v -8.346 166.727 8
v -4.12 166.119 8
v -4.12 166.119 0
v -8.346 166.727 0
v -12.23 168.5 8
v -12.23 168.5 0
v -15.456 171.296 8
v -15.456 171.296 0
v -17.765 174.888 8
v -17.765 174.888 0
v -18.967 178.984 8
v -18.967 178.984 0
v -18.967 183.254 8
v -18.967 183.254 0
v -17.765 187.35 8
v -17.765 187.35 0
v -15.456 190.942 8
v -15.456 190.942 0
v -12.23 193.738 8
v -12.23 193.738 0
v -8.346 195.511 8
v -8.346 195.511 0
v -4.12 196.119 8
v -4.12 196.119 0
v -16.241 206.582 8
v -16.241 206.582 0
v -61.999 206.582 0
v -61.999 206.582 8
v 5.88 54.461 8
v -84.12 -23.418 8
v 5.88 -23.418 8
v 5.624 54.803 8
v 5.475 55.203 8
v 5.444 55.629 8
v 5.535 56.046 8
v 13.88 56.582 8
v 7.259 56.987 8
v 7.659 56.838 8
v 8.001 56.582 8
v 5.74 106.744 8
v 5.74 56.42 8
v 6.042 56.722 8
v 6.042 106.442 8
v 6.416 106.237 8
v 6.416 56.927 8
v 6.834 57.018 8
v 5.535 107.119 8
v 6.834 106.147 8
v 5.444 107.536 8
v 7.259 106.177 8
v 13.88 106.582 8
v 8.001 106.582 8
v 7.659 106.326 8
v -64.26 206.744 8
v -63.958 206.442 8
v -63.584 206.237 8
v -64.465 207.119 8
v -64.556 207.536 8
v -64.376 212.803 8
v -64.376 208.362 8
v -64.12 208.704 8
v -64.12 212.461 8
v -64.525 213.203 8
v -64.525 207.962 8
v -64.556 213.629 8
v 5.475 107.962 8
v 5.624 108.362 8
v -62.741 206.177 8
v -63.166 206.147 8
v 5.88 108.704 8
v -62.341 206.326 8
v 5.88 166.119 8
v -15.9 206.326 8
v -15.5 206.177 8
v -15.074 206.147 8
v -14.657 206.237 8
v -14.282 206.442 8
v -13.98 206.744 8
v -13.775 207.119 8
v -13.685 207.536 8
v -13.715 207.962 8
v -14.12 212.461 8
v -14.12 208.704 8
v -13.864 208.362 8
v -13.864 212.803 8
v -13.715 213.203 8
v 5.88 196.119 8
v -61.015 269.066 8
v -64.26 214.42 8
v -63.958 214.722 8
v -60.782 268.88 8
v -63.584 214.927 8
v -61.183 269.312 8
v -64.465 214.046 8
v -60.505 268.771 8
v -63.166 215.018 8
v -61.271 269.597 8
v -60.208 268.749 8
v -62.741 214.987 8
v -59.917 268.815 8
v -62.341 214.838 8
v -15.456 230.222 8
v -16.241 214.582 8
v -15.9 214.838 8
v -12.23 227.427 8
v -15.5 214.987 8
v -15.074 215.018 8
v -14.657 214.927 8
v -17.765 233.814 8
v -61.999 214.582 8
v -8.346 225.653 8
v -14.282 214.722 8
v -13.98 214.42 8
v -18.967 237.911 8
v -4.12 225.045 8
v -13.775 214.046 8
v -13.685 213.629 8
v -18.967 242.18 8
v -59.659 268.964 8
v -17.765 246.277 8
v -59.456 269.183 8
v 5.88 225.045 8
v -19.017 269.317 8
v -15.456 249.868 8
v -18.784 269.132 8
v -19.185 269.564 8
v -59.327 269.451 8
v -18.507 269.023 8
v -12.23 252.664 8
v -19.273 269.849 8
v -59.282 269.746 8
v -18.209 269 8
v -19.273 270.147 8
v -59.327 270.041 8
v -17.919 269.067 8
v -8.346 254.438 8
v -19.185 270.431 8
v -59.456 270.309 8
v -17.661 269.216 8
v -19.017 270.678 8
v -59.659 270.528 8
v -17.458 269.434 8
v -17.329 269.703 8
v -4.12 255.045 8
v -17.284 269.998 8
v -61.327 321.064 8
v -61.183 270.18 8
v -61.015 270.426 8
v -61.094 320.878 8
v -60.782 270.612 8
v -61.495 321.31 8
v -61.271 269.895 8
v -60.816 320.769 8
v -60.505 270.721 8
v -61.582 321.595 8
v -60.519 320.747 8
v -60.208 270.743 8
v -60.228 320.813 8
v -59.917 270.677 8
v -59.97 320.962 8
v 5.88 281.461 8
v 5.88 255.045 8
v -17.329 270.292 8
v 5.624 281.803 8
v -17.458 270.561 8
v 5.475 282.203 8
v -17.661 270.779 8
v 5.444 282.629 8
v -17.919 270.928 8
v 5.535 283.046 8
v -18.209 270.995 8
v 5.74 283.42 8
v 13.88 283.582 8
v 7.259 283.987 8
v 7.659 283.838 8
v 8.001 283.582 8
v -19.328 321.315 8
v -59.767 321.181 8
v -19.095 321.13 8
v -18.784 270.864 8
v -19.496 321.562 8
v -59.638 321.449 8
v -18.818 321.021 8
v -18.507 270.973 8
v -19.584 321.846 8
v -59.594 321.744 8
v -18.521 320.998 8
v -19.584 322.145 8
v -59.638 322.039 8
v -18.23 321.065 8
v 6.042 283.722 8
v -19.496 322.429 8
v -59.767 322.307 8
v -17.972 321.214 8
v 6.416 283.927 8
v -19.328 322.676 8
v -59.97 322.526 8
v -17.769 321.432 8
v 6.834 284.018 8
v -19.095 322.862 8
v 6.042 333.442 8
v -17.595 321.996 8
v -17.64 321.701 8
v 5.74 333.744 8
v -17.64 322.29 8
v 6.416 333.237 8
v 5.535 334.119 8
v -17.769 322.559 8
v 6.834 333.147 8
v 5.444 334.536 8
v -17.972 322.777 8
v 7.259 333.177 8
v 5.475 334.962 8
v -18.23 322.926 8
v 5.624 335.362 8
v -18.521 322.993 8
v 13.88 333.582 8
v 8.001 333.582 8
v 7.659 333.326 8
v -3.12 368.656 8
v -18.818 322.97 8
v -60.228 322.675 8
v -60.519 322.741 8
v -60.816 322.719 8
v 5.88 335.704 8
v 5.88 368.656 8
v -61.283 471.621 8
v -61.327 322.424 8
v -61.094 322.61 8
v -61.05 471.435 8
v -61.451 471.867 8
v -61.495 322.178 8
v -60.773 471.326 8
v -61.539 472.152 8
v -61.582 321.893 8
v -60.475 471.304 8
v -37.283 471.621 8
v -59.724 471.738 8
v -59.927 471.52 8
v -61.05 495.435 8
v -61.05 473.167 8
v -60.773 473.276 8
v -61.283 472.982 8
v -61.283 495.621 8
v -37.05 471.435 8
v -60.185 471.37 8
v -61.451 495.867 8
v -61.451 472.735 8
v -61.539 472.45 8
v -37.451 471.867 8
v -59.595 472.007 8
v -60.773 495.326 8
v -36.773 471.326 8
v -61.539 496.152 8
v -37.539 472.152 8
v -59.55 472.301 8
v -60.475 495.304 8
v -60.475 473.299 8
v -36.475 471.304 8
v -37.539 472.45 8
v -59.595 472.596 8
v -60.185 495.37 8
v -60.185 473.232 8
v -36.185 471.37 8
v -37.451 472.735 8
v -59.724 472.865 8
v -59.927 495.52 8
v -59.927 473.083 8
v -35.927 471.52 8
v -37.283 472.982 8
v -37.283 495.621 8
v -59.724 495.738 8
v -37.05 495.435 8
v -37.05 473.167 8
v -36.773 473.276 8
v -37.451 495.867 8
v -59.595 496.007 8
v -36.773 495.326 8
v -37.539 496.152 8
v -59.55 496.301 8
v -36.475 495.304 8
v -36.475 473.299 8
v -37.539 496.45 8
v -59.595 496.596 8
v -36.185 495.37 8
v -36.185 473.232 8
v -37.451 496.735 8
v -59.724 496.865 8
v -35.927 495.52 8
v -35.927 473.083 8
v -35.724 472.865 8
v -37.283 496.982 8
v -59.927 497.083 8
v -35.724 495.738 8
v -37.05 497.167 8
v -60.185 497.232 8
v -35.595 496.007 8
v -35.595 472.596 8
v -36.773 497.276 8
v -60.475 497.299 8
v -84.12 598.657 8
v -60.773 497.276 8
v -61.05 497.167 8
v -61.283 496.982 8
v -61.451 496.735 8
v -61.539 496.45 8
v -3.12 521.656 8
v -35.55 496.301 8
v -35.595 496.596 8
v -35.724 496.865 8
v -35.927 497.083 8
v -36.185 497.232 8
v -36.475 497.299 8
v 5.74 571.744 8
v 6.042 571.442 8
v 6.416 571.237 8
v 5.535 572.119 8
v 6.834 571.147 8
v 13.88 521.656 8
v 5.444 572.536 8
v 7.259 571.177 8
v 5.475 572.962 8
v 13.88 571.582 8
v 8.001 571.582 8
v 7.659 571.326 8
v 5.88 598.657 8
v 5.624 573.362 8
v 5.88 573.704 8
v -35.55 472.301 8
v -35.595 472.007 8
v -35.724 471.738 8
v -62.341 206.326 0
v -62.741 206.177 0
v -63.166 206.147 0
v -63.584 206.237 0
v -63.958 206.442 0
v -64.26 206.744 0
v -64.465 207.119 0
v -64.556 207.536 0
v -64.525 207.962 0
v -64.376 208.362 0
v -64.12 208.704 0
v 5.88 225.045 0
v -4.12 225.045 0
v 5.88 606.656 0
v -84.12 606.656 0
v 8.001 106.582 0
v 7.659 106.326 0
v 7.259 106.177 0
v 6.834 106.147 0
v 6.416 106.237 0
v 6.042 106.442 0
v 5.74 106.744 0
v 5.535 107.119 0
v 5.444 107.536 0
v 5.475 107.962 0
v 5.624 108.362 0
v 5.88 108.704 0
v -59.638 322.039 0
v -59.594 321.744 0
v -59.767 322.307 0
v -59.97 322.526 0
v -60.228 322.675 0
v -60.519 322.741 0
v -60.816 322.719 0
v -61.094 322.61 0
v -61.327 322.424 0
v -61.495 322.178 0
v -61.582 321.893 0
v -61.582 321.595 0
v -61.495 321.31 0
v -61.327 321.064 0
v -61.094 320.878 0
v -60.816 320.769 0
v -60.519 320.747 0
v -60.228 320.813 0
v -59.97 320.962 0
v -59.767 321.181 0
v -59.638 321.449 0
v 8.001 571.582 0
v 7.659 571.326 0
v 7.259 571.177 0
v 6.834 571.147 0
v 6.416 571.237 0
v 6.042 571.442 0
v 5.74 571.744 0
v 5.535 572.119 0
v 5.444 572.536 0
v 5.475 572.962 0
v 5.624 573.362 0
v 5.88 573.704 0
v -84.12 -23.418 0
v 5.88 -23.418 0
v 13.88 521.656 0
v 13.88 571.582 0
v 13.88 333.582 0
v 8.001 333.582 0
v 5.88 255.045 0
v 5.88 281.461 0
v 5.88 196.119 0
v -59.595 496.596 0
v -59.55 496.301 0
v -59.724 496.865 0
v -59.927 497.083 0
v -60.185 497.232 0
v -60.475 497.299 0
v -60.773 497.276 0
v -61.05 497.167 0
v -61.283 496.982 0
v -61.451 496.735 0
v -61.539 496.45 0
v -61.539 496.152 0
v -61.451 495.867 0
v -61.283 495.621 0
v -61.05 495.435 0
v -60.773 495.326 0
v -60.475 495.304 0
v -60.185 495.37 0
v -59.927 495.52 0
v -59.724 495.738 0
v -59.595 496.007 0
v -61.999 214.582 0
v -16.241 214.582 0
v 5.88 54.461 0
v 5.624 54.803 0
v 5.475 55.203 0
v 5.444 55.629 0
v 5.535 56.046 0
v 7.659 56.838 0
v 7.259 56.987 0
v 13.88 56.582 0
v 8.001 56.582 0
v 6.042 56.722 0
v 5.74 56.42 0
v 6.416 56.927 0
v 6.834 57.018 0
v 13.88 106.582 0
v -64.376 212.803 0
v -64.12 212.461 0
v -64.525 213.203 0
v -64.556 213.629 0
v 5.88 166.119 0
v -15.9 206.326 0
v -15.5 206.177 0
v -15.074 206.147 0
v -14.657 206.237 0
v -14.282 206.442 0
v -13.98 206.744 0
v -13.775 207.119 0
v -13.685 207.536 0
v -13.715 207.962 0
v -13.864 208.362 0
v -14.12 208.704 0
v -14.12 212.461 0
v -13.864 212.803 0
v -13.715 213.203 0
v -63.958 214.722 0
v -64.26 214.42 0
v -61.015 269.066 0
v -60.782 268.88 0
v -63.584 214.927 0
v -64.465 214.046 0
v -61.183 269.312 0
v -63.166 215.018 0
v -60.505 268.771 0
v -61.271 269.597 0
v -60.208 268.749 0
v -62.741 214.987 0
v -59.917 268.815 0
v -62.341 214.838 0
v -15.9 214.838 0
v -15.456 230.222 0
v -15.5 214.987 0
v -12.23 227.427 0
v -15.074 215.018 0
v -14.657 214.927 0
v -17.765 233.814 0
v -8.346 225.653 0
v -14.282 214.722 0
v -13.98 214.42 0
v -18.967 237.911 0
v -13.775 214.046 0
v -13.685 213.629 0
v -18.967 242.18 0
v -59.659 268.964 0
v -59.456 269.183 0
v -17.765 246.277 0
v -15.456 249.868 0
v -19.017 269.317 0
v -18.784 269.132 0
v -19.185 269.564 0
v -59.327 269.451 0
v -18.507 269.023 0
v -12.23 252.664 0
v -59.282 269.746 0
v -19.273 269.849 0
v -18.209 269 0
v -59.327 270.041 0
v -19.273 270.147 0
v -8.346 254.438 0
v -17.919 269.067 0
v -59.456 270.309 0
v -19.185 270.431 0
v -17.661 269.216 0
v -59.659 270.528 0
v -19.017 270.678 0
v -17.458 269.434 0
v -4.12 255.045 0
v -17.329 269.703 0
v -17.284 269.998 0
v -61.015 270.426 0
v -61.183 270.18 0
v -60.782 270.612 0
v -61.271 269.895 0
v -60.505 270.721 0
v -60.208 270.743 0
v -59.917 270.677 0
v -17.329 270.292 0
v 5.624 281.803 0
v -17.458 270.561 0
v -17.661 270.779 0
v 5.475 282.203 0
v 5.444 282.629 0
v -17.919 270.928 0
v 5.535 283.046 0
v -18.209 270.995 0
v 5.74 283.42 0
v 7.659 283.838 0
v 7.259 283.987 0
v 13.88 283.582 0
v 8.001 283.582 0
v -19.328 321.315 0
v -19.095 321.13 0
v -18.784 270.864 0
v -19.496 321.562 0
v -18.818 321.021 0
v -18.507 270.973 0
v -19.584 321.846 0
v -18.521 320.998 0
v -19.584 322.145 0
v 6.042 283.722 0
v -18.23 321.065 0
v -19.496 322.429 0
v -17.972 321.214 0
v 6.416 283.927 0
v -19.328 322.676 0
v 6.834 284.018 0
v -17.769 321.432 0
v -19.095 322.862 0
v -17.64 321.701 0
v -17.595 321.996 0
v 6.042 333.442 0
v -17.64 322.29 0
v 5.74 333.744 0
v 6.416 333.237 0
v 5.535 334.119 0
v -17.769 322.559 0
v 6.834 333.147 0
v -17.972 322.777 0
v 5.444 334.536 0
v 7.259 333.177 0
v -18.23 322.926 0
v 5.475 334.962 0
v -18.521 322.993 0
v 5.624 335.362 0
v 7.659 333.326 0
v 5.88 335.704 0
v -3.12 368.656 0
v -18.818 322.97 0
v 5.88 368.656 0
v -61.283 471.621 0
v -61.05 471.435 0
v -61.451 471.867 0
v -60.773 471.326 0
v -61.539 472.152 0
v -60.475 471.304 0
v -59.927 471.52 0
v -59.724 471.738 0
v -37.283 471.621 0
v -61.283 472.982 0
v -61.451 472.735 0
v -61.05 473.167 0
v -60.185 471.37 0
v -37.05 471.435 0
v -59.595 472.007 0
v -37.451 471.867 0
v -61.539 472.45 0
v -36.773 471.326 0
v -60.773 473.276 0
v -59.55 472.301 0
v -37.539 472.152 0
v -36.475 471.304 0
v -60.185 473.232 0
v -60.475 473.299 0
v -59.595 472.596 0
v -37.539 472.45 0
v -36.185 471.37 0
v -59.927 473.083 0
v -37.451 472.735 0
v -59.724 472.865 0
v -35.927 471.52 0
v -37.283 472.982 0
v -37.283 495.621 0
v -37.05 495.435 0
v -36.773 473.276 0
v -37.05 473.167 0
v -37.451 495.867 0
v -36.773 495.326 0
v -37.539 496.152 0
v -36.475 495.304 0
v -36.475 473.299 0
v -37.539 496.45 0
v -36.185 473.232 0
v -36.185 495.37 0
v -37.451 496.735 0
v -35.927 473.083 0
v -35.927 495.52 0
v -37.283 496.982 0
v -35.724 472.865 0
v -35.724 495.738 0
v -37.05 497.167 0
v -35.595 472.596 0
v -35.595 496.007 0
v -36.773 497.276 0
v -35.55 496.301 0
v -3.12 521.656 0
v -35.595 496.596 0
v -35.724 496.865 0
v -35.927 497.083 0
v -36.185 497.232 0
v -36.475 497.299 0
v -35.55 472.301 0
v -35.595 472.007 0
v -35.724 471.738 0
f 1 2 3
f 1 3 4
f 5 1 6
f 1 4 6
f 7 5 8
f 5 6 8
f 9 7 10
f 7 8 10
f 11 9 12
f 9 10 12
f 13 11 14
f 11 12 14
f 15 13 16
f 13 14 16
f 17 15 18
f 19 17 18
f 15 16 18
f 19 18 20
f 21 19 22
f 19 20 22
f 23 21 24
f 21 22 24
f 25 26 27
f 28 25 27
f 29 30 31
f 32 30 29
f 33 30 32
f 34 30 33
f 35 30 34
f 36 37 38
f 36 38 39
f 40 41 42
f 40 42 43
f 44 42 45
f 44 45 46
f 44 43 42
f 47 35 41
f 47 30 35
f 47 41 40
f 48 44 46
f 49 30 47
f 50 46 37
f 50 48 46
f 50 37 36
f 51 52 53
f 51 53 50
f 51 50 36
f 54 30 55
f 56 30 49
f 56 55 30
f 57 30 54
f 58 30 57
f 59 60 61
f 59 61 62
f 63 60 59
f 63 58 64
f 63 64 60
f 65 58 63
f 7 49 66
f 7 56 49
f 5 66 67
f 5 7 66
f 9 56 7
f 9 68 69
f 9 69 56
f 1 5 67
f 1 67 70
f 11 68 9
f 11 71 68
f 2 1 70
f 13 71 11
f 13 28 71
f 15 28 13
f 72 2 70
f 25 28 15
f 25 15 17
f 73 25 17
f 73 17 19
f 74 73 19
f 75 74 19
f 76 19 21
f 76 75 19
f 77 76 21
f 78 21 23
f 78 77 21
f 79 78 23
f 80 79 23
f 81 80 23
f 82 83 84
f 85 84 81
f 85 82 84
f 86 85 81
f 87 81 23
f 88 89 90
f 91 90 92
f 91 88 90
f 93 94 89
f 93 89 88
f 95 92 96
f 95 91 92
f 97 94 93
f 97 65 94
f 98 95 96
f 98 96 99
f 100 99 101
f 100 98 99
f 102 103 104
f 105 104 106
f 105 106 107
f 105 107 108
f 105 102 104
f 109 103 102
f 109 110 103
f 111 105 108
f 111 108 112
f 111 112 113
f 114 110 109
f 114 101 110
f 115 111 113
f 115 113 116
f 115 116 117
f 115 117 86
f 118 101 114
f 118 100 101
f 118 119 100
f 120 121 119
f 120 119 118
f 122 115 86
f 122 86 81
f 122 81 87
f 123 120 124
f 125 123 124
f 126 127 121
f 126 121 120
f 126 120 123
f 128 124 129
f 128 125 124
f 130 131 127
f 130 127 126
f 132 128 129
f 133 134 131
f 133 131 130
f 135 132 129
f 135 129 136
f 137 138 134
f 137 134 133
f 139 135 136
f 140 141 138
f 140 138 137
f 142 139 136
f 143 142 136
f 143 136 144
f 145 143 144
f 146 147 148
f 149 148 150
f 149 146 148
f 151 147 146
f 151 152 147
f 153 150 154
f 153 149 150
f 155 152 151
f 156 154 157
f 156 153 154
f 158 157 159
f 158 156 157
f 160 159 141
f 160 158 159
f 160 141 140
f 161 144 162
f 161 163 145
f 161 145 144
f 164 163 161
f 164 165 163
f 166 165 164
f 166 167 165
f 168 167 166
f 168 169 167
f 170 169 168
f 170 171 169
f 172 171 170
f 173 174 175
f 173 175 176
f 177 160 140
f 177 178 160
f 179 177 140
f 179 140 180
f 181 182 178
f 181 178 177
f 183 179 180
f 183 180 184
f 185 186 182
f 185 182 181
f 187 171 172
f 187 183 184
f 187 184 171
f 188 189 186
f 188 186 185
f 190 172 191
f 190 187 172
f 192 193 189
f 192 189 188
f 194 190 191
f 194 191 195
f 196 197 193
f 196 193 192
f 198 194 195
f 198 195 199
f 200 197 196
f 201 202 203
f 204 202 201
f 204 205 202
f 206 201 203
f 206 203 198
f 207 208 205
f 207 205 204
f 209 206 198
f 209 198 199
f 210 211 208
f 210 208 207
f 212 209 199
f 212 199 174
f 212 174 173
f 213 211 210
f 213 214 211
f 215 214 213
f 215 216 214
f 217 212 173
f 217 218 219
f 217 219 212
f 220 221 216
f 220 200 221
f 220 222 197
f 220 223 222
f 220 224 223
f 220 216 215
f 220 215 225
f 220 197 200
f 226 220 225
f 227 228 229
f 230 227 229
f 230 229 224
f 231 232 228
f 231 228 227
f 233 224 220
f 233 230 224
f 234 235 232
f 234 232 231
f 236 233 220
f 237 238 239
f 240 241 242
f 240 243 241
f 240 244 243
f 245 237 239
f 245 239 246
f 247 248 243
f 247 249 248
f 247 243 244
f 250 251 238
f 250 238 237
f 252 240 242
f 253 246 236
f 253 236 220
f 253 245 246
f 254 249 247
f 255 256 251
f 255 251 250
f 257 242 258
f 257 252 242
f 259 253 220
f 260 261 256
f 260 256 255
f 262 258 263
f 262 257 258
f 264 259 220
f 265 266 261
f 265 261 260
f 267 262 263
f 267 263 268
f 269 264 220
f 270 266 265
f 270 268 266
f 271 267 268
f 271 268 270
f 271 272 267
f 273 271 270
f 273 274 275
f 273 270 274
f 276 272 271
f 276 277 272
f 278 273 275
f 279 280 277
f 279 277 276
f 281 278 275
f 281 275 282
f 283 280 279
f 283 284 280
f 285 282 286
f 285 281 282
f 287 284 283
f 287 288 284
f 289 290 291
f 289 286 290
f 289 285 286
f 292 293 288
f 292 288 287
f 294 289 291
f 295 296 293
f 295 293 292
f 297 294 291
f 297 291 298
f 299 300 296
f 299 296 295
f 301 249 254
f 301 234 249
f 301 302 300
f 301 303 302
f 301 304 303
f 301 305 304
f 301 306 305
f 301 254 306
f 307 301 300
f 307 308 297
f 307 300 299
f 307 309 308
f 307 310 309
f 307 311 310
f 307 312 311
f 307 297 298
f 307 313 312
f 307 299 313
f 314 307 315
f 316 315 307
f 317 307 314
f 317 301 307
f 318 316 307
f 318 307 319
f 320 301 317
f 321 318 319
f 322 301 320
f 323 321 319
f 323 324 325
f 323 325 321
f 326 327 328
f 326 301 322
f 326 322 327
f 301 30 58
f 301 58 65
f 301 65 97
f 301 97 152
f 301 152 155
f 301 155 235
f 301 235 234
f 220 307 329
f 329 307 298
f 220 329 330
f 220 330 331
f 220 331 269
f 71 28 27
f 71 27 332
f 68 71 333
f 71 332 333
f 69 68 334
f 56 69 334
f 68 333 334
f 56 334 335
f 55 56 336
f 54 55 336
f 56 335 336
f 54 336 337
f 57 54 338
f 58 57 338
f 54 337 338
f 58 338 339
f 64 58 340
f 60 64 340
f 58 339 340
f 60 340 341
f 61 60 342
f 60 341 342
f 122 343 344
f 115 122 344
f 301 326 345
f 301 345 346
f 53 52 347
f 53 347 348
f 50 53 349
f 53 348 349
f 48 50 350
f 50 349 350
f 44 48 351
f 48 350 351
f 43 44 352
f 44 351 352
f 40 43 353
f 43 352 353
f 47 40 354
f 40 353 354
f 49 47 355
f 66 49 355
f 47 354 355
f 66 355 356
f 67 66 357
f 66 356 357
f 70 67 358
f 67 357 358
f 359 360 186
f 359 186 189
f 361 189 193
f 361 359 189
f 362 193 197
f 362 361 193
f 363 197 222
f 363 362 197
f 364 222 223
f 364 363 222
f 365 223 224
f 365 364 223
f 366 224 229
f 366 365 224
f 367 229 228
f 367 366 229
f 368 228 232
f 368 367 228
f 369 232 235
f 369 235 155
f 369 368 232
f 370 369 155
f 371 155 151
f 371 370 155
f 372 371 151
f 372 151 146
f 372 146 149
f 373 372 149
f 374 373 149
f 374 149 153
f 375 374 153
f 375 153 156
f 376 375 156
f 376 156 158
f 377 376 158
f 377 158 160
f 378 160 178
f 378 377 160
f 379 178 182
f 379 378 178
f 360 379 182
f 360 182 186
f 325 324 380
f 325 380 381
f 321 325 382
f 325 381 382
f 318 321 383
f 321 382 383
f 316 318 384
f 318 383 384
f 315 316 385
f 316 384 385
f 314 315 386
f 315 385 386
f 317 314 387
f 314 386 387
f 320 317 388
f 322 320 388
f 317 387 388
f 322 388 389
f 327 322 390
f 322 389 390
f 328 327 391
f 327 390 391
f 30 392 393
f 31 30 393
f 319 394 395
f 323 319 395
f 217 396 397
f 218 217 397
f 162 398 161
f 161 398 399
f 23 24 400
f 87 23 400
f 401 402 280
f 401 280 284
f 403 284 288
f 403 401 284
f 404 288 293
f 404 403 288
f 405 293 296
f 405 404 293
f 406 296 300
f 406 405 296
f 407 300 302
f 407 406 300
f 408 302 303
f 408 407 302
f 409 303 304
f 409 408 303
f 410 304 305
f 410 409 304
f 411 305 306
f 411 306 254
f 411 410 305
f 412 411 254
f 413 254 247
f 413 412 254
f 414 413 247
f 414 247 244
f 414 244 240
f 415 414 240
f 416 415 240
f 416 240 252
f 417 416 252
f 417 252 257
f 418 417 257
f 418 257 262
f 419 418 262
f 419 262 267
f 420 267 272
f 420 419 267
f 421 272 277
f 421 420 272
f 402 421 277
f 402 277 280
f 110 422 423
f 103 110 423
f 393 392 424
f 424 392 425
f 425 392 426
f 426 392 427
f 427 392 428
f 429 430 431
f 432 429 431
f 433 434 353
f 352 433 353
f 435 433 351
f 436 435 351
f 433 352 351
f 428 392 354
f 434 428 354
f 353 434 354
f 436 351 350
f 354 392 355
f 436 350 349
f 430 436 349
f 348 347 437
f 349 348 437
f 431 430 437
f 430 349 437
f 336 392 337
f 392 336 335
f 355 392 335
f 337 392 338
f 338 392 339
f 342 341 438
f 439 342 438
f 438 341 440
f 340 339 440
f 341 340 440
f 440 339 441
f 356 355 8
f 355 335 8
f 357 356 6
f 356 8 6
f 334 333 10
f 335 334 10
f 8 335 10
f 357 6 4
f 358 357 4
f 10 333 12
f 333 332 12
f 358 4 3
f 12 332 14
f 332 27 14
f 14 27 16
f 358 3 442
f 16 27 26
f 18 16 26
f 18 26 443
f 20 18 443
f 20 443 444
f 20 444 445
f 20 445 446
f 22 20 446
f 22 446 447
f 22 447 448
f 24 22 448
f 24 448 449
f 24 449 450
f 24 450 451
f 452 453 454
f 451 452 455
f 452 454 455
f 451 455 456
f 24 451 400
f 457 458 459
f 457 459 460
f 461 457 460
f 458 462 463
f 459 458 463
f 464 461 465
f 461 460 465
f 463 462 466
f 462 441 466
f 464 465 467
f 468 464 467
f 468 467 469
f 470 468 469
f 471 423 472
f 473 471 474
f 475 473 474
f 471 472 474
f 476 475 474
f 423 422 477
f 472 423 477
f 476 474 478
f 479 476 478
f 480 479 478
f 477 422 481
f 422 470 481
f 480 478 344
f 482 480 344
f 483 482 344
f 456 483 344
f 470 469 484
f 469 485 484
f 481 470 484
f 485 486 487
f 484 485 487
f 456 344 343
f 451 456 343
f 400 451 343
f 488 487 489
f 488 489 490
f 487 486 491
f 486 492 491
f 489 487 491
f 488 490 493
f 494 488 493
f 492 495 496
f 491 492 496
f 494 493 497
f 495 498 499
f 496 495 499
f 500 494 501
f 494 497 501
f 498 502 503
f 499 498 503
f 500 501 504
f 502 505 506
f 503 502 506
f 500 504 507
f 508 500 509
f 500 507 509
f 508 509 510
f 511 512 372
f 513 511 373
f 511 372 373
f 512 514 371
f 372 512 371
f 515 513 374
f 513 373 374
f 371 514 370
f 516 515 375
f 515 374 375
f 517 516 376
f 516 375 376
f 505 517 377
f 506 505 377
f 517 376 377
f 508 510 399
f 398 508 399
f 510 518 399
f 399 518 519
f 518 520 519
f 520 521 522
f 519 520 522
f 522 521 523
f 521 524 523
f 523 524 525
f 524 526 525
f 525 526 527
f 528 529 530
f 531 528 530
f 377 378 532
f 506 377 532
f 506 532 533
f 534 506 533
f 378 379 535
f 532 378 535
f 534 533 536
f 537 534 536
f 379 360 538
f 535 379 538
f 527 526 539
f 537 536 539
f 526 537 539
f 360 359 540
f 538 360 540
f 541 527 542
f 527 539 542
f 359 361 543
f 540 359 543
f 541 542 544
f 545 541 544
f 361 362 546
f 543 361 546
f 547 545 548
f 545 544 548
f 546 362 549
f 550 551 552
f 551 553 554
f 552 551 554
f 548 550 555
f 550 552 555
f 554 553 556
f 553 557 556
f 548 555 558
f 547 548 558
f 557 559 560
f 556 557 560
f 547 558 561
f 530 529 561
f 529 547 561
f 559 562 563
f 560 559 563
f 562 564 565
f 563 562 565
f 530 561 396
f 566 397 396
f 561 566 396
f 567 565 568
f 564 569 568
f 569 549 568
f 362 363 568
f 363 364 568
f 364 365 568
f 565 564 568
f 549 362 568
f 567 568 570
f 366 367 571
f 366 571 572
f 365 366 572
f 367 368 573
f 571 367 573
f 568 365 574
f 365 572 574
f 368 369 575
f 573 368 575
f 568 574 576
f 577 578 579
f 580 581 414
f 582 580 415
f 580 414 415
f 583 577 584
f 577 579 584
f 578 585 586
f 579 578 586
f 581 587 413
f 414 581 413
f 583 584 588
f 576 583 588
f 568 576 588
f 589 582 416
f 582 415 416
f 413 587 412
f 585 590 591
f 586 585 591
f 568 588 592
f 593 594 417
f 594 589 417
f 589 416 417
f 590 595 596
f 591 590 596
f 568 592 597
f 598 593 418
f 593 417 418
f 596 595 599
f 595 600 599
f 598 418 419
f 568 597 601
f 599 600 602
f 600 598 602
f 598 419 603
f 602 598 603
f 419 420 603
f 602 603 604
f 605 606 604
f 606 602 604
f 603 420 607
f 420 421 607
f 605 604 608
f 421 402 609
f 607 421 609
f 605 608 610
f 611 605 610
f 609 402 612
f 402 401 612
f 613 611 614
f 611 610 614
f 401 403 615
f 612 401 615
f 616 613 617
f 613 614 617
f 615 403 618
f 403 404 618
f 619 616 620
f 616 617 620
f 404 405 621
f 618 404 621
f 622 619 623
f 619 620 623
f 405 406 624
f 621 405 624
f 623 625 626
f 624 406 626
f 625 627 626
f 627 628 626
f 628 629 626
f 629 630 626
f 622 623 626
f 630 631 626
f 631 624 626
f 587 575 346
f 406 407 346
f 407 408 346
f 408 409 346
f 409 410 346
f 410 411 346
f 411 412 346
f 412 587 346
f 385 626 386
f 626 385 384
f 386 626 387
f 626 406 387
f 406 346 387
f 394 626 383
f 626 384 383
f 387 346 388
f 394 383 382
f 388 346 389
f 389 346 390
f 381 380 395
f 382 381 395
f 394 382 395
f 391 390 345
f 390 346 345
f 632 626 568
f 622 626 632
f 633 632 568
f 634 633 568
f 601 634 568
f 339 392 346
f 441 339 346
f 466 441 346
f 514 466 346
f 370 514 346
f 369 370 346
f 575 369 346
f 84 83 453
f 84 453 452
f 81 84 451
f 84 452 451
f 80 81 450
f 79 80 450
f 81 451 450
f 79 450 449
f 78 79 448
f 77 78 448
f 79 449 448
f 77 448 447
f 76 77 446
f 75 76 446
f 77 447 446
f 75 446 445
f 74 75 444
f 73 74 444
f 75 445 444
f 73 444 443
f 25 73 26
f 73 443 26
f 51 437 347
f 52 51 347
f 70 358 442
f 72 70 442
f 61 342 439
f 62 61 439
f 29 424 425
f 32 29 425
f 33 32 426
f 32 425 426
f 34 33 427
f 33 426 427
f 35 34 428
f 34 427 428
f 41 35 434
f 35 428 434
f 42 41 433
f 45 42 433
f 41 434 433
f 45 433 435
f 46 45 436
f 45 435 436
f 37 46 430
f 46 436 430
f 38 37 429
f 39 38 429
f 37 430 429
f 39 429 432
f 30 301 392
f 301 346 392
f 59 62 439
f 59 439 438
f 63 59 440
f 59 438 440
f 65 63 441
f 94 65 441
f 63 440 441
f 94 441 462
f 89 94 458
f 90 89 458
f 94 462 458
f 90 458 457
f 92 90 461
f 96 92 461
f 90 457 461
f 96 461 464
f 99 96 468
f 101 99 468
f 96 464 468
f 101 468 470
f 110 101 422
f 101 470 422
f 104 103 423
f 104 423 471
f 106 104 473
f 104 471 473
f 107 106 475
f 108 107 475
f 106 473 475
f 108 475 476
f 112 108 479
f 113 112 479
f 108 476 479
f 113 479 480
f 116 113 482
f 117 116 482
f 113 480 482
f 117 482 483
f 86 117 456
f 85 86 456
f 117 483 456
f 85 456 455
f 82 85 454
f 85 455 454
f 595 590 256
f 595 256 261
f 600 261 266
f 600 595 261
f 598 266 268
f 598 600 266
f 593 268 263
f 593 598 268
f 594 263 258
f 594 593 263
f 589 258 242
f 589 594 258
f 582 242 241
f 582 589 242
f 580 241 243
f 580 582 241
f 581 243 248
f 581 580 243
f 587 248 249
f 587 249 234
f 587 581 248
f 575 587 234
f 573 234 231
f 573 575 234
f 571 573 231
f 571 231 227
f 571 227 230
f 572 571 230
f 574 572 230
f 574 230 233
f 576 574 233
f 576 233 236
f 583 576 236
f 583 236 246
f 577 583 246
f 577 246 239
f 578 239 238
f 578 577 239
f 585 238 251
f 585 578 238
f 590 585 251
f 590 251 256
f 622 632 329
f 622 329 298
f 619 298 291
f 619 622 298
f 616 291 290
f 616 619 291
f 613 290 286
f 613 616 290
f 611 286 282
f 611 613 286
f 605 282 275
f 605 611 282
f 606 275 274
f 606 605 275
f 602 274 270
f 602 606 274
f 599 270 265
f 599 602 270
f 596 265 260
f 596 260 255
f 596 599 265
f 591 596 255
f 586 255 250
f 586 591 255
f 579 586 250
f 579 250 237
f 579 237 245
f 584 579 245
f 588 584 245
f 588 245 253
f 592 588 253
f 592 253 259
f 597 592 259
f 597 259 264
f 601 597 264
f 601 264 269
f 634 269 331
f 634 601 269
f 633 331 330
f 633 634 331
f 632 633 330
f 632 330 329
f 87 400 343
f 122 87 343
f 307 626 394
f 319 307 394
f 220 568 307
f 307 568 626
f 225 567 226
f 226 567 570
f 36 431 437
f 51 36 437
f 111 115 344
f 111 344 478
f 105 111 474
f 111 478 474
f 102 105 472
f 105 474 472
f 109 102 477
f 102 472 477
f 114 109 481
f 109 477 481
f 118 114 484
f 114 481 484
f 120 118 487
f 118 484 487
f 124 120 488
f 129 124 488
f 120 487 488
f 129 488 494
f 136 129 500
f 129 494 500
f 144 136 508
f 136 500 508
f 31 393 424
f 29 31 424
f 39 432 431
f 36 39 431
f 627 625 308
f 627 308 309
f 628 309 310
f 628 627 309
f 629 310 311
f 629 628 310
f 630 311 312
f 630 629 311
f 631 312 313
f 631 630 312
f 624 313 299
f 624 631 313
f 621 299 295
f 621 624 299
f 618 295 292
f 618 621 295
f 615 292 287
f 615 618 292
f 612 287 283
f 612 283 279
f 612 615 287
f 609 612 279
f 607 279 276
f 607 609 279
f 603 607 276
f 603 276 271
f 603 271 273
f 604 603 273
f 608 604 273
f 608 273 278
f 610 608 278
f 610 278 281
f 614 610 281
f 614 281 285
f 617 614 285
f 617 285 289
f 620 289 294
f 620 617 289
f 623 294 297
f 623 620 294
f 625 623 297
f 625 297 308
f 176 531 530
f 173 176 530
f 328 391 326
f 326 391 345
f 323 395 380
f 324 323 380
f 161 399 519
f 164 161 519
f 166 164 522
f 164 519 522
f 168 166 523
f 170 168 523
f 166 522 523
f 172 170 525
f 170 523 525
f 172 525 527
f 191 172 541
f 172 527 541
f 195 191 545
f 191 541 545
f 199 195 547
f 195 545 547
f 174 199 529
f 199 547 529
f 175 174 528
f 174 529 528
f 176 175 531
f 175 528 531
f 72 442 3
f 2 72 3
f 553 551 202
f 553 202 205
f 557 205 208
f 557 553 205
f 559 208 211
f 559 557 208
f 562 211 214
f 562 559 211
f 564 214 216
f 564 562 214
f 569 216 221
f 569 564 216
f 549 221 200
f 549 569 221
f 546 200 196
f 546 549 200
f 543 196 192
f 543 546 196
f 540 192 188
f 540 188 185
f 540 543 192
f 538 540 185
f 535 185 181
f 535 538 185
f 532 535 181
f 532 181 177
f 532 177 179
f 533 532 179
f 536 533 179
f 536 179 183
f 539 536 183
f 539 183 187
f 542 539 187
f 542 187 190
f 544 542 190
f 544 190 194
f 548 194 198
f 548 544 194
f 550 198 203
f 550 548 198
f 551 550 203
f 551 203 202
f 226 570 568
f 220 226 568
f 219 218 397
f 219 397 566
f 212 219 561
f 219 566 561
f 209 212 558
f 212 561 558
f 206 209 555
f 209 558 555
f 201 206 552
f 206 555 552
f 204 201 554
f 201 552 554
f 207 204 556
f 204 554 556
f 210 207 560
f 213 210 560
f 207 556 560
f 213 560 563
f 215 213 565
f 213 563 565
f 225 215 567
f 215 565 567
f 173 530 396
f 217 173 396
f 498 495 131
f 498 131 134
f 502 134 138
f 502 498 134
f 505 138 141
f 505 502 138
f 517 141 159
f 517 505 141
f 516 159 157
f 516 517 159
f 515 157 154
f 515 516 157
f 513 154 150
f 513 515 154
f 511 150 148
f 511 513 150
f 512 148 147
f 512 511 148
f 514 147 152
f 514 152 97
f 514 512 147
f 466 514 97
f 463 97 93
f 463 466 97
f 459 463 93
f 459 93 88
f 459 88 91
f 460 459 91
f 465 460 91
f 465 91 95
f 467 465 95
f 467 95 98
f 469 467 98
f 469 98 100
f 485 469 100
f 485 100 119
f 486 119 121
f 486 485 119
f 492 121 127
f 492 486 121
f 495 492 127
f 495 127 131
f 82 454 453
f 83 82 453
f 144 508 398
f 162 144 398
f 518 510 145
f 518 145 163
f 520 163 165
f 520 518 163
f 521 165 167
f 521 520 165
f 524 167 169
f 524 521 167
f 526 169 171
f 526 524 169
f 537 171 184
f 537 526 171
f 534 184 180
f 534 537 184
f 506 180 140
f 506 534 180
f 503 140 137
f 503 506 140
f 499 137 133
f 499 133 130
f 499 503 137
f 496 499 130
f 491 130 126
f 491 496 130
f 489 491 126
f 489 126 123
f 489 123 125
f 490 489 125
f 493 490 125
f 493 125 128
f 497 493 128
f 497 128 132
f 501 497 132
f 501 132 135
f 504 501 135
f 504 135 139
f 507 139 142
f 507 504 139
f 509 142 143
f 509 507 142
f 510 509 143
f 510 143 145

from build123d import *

# Parameters (mm, degrees)
ESQUISSE1_R        = 1
BOSS_EXTRU_1_DEPTH = 8
CHANFREIN1_SIZE    = 8


with BuildPart() as part:
    # Esquisse1 → Boss.-Extru.1 (new body)
    with BuildSketch(Plane.XY):
        with BuildLine():
            Line((5.879855223, 335.703540816), (5.879855223, 368.656410216))
            Line((5.879855223, 368.656410216), (-3.120144777, 368.656410216))
            Line((-3.120144777, 368.656410216), (-3.120144777, 521.656410212))
            Line((-3.120144777, 521.656410212), (13.879855223, 521.656410212))
            Line((13.879855223, 521.656410212), (13.879855223, 571.582220472))
            Line((13.879855223, 571.582220472), (8.001175566, 571.582220472))
            ThreePointArc((8.001175566, 571.582220472), (5.879855223, 571.582220472), (5.879855223, 573.703540816))
            Line((5.879855223, 573.703540816), (5.879855223, 596.798102411))
            Line((5.879855223, 596.798102411), (5.879855223, 606.656410212))
            Line((5.879855223, 606.656410212), (-84.120144777, 606.656410212))
            Line((-84.120144777, 606.656410212), (-84.120144777, 596.798102411))
            Line((-84.120144777, 596.798102411), (-84.120144777, -23.417779528))
            Line((-84.120144777, -23.417779528), (5.879855223, -23.417779528))
            Line((5.879855223, -23.417779528), (5.879855223, 54.460900128))
            ThreePointArc((5.879855223, 54.460900128), (5.879855223, 56.582220472), (8.001175566, 56.582220472))
            Line((8.001175566, 56.582220472), (13.879855223, 56.582220472))
            Line((13.879855223, 56.582220472), (13.879855223, 106.582220472))
            Line((13.879855223, 106.582220472), (8.001175566, 106.582220472))
            ThreePointArc((8.001175566, 106.582220472), (5.879855223, 106.582220472), (5.879855223, 108.703540816))
            Line((5.879855223, 108.703540816), (5.879855223, 166.119071534))
            Line((5.879855223, 166.119071534), (-4.120144777, 166.119071534))
            ThreePointArc((-4.120144777, 166.119071534), (-19.120144777, 181.119071534), (-4.120144777, 196.119071534))
            Line((-4.120144777, 196.119071534), (5.879855223, 196.119071534))
            Line((5.879855223, 196.119071534), (5.879855223, 225.04536941))
            Line((5.879855223, 225.04536941), (-4.120144777, 225.04536941))
            ThreePointArc((-4.120144777, 225.04536941), (-19.120144777, 240.04536941), (-4.120144777, 255.04536941))
            Line((-4.120144777, 255.04536941), (5.879855223, 255.04536941))
            Line((5.879855223, 255.04536941), (5.879855223, 281.460900128))
            ThreePointArc((5.879855223, 281.460900128), (5.879855223, 283.582220472), (8.001175566, 283.582220472))
            Line((8.001175566, 283.582220472), (13.879855223, 283.582220472))
            Line((13.879855223, 283.582220472), (13.879855223, 333.582220472))
            Line((13.879855223, 333.582220472), (8.001175566, 333.582220472))
            ThreePointArc((8.001175566, 333.582220472), (5.879855223, 333.582220472), (5.879855223, 335.703540816))
        make_face()
        with Locations((-60.550144777, 496.30133456)):
            Circle(ESQUISSE1_R, mode=Mode.SUBTRACT)
        with Locations((-36.550144777, 496.30133456)):
            Circle(ESQUISSE1_R, mode=Mode.SUBTRACT)
        with Locations((-60.550144777, 472.30133456)):
            Circle(ESQUISSE1_R, mode=Mode.SUBTRACT)
        with Locations((-36.550144777, 472.30133456)):
            Circle(ESQUISSE1_R, mode=Mode.SUBTRACT)
        with Locations((-60.593593351, 321.744120307)):
            Circle(ESQUISSE1_R, mode=Mode.SUBTRACT)
        with Locations((-18.595445866, 321.995534365)):
            Circle(ESQUISSE1_R, mode=Mode.SUBTRACT)
        with Locations((-18.28416987, 269.997586055)):
            Circle(ESQUISSE1_R, mode=Mode.SUBTRACT)
        with Locations((-60.282317355, 269.746171996)):
            Circle(ESQUISSE1_R, mode=Mode.SUBTRACT)
        with BuildLine():
            Line((-61.998824434, 214.582220472), (-16.241465121, 214.582220472))
            ThreePointArc((-16.241465121, 214.582220472), (-14.120144777, 214.582220472), (-14.120144777, 212.460900128))
            Line((-14.120144777, 212.460900128), (-14.120144777, 208.703540816))
            ThreePointArc((-14.120144777, 208.703540816), (-14.120144777, 206.582220472), (-16.241465121, 206.582220472))
            Line((-16.241465121, 206.582220472), (-61.998824434, 206.582220472))
            ThreePointArc((-61.998824434, 206.582220472), (-64.120144777, 206.582220472), (-64.120144777, 208.703540816))
            Line((-64.120144777, 208.703540816), (-64.120144777, 212.460900128))
            ThreePointArc((-64.120144777, 212.460900128), (-64.120144777, 214.582220472), (-61.998824434, 214.582220472))
        make_face(mode=Mode.SUBTRACT)
    extrude(amount=BOSS_EXTRU_1_DEPTH)

    # Chanfrein1
    chanfrein1_edges = [part.edges().sort_by_distance(p)[0] for p in [
        (-39.120144777, 606.656410212, 8),
    ]]
    chamfer(chanfrein1_edges, length=CHANFREIN1_SIZE - 0.0001)  # a hair under: the kernel refuses the full size


solid = part.part
